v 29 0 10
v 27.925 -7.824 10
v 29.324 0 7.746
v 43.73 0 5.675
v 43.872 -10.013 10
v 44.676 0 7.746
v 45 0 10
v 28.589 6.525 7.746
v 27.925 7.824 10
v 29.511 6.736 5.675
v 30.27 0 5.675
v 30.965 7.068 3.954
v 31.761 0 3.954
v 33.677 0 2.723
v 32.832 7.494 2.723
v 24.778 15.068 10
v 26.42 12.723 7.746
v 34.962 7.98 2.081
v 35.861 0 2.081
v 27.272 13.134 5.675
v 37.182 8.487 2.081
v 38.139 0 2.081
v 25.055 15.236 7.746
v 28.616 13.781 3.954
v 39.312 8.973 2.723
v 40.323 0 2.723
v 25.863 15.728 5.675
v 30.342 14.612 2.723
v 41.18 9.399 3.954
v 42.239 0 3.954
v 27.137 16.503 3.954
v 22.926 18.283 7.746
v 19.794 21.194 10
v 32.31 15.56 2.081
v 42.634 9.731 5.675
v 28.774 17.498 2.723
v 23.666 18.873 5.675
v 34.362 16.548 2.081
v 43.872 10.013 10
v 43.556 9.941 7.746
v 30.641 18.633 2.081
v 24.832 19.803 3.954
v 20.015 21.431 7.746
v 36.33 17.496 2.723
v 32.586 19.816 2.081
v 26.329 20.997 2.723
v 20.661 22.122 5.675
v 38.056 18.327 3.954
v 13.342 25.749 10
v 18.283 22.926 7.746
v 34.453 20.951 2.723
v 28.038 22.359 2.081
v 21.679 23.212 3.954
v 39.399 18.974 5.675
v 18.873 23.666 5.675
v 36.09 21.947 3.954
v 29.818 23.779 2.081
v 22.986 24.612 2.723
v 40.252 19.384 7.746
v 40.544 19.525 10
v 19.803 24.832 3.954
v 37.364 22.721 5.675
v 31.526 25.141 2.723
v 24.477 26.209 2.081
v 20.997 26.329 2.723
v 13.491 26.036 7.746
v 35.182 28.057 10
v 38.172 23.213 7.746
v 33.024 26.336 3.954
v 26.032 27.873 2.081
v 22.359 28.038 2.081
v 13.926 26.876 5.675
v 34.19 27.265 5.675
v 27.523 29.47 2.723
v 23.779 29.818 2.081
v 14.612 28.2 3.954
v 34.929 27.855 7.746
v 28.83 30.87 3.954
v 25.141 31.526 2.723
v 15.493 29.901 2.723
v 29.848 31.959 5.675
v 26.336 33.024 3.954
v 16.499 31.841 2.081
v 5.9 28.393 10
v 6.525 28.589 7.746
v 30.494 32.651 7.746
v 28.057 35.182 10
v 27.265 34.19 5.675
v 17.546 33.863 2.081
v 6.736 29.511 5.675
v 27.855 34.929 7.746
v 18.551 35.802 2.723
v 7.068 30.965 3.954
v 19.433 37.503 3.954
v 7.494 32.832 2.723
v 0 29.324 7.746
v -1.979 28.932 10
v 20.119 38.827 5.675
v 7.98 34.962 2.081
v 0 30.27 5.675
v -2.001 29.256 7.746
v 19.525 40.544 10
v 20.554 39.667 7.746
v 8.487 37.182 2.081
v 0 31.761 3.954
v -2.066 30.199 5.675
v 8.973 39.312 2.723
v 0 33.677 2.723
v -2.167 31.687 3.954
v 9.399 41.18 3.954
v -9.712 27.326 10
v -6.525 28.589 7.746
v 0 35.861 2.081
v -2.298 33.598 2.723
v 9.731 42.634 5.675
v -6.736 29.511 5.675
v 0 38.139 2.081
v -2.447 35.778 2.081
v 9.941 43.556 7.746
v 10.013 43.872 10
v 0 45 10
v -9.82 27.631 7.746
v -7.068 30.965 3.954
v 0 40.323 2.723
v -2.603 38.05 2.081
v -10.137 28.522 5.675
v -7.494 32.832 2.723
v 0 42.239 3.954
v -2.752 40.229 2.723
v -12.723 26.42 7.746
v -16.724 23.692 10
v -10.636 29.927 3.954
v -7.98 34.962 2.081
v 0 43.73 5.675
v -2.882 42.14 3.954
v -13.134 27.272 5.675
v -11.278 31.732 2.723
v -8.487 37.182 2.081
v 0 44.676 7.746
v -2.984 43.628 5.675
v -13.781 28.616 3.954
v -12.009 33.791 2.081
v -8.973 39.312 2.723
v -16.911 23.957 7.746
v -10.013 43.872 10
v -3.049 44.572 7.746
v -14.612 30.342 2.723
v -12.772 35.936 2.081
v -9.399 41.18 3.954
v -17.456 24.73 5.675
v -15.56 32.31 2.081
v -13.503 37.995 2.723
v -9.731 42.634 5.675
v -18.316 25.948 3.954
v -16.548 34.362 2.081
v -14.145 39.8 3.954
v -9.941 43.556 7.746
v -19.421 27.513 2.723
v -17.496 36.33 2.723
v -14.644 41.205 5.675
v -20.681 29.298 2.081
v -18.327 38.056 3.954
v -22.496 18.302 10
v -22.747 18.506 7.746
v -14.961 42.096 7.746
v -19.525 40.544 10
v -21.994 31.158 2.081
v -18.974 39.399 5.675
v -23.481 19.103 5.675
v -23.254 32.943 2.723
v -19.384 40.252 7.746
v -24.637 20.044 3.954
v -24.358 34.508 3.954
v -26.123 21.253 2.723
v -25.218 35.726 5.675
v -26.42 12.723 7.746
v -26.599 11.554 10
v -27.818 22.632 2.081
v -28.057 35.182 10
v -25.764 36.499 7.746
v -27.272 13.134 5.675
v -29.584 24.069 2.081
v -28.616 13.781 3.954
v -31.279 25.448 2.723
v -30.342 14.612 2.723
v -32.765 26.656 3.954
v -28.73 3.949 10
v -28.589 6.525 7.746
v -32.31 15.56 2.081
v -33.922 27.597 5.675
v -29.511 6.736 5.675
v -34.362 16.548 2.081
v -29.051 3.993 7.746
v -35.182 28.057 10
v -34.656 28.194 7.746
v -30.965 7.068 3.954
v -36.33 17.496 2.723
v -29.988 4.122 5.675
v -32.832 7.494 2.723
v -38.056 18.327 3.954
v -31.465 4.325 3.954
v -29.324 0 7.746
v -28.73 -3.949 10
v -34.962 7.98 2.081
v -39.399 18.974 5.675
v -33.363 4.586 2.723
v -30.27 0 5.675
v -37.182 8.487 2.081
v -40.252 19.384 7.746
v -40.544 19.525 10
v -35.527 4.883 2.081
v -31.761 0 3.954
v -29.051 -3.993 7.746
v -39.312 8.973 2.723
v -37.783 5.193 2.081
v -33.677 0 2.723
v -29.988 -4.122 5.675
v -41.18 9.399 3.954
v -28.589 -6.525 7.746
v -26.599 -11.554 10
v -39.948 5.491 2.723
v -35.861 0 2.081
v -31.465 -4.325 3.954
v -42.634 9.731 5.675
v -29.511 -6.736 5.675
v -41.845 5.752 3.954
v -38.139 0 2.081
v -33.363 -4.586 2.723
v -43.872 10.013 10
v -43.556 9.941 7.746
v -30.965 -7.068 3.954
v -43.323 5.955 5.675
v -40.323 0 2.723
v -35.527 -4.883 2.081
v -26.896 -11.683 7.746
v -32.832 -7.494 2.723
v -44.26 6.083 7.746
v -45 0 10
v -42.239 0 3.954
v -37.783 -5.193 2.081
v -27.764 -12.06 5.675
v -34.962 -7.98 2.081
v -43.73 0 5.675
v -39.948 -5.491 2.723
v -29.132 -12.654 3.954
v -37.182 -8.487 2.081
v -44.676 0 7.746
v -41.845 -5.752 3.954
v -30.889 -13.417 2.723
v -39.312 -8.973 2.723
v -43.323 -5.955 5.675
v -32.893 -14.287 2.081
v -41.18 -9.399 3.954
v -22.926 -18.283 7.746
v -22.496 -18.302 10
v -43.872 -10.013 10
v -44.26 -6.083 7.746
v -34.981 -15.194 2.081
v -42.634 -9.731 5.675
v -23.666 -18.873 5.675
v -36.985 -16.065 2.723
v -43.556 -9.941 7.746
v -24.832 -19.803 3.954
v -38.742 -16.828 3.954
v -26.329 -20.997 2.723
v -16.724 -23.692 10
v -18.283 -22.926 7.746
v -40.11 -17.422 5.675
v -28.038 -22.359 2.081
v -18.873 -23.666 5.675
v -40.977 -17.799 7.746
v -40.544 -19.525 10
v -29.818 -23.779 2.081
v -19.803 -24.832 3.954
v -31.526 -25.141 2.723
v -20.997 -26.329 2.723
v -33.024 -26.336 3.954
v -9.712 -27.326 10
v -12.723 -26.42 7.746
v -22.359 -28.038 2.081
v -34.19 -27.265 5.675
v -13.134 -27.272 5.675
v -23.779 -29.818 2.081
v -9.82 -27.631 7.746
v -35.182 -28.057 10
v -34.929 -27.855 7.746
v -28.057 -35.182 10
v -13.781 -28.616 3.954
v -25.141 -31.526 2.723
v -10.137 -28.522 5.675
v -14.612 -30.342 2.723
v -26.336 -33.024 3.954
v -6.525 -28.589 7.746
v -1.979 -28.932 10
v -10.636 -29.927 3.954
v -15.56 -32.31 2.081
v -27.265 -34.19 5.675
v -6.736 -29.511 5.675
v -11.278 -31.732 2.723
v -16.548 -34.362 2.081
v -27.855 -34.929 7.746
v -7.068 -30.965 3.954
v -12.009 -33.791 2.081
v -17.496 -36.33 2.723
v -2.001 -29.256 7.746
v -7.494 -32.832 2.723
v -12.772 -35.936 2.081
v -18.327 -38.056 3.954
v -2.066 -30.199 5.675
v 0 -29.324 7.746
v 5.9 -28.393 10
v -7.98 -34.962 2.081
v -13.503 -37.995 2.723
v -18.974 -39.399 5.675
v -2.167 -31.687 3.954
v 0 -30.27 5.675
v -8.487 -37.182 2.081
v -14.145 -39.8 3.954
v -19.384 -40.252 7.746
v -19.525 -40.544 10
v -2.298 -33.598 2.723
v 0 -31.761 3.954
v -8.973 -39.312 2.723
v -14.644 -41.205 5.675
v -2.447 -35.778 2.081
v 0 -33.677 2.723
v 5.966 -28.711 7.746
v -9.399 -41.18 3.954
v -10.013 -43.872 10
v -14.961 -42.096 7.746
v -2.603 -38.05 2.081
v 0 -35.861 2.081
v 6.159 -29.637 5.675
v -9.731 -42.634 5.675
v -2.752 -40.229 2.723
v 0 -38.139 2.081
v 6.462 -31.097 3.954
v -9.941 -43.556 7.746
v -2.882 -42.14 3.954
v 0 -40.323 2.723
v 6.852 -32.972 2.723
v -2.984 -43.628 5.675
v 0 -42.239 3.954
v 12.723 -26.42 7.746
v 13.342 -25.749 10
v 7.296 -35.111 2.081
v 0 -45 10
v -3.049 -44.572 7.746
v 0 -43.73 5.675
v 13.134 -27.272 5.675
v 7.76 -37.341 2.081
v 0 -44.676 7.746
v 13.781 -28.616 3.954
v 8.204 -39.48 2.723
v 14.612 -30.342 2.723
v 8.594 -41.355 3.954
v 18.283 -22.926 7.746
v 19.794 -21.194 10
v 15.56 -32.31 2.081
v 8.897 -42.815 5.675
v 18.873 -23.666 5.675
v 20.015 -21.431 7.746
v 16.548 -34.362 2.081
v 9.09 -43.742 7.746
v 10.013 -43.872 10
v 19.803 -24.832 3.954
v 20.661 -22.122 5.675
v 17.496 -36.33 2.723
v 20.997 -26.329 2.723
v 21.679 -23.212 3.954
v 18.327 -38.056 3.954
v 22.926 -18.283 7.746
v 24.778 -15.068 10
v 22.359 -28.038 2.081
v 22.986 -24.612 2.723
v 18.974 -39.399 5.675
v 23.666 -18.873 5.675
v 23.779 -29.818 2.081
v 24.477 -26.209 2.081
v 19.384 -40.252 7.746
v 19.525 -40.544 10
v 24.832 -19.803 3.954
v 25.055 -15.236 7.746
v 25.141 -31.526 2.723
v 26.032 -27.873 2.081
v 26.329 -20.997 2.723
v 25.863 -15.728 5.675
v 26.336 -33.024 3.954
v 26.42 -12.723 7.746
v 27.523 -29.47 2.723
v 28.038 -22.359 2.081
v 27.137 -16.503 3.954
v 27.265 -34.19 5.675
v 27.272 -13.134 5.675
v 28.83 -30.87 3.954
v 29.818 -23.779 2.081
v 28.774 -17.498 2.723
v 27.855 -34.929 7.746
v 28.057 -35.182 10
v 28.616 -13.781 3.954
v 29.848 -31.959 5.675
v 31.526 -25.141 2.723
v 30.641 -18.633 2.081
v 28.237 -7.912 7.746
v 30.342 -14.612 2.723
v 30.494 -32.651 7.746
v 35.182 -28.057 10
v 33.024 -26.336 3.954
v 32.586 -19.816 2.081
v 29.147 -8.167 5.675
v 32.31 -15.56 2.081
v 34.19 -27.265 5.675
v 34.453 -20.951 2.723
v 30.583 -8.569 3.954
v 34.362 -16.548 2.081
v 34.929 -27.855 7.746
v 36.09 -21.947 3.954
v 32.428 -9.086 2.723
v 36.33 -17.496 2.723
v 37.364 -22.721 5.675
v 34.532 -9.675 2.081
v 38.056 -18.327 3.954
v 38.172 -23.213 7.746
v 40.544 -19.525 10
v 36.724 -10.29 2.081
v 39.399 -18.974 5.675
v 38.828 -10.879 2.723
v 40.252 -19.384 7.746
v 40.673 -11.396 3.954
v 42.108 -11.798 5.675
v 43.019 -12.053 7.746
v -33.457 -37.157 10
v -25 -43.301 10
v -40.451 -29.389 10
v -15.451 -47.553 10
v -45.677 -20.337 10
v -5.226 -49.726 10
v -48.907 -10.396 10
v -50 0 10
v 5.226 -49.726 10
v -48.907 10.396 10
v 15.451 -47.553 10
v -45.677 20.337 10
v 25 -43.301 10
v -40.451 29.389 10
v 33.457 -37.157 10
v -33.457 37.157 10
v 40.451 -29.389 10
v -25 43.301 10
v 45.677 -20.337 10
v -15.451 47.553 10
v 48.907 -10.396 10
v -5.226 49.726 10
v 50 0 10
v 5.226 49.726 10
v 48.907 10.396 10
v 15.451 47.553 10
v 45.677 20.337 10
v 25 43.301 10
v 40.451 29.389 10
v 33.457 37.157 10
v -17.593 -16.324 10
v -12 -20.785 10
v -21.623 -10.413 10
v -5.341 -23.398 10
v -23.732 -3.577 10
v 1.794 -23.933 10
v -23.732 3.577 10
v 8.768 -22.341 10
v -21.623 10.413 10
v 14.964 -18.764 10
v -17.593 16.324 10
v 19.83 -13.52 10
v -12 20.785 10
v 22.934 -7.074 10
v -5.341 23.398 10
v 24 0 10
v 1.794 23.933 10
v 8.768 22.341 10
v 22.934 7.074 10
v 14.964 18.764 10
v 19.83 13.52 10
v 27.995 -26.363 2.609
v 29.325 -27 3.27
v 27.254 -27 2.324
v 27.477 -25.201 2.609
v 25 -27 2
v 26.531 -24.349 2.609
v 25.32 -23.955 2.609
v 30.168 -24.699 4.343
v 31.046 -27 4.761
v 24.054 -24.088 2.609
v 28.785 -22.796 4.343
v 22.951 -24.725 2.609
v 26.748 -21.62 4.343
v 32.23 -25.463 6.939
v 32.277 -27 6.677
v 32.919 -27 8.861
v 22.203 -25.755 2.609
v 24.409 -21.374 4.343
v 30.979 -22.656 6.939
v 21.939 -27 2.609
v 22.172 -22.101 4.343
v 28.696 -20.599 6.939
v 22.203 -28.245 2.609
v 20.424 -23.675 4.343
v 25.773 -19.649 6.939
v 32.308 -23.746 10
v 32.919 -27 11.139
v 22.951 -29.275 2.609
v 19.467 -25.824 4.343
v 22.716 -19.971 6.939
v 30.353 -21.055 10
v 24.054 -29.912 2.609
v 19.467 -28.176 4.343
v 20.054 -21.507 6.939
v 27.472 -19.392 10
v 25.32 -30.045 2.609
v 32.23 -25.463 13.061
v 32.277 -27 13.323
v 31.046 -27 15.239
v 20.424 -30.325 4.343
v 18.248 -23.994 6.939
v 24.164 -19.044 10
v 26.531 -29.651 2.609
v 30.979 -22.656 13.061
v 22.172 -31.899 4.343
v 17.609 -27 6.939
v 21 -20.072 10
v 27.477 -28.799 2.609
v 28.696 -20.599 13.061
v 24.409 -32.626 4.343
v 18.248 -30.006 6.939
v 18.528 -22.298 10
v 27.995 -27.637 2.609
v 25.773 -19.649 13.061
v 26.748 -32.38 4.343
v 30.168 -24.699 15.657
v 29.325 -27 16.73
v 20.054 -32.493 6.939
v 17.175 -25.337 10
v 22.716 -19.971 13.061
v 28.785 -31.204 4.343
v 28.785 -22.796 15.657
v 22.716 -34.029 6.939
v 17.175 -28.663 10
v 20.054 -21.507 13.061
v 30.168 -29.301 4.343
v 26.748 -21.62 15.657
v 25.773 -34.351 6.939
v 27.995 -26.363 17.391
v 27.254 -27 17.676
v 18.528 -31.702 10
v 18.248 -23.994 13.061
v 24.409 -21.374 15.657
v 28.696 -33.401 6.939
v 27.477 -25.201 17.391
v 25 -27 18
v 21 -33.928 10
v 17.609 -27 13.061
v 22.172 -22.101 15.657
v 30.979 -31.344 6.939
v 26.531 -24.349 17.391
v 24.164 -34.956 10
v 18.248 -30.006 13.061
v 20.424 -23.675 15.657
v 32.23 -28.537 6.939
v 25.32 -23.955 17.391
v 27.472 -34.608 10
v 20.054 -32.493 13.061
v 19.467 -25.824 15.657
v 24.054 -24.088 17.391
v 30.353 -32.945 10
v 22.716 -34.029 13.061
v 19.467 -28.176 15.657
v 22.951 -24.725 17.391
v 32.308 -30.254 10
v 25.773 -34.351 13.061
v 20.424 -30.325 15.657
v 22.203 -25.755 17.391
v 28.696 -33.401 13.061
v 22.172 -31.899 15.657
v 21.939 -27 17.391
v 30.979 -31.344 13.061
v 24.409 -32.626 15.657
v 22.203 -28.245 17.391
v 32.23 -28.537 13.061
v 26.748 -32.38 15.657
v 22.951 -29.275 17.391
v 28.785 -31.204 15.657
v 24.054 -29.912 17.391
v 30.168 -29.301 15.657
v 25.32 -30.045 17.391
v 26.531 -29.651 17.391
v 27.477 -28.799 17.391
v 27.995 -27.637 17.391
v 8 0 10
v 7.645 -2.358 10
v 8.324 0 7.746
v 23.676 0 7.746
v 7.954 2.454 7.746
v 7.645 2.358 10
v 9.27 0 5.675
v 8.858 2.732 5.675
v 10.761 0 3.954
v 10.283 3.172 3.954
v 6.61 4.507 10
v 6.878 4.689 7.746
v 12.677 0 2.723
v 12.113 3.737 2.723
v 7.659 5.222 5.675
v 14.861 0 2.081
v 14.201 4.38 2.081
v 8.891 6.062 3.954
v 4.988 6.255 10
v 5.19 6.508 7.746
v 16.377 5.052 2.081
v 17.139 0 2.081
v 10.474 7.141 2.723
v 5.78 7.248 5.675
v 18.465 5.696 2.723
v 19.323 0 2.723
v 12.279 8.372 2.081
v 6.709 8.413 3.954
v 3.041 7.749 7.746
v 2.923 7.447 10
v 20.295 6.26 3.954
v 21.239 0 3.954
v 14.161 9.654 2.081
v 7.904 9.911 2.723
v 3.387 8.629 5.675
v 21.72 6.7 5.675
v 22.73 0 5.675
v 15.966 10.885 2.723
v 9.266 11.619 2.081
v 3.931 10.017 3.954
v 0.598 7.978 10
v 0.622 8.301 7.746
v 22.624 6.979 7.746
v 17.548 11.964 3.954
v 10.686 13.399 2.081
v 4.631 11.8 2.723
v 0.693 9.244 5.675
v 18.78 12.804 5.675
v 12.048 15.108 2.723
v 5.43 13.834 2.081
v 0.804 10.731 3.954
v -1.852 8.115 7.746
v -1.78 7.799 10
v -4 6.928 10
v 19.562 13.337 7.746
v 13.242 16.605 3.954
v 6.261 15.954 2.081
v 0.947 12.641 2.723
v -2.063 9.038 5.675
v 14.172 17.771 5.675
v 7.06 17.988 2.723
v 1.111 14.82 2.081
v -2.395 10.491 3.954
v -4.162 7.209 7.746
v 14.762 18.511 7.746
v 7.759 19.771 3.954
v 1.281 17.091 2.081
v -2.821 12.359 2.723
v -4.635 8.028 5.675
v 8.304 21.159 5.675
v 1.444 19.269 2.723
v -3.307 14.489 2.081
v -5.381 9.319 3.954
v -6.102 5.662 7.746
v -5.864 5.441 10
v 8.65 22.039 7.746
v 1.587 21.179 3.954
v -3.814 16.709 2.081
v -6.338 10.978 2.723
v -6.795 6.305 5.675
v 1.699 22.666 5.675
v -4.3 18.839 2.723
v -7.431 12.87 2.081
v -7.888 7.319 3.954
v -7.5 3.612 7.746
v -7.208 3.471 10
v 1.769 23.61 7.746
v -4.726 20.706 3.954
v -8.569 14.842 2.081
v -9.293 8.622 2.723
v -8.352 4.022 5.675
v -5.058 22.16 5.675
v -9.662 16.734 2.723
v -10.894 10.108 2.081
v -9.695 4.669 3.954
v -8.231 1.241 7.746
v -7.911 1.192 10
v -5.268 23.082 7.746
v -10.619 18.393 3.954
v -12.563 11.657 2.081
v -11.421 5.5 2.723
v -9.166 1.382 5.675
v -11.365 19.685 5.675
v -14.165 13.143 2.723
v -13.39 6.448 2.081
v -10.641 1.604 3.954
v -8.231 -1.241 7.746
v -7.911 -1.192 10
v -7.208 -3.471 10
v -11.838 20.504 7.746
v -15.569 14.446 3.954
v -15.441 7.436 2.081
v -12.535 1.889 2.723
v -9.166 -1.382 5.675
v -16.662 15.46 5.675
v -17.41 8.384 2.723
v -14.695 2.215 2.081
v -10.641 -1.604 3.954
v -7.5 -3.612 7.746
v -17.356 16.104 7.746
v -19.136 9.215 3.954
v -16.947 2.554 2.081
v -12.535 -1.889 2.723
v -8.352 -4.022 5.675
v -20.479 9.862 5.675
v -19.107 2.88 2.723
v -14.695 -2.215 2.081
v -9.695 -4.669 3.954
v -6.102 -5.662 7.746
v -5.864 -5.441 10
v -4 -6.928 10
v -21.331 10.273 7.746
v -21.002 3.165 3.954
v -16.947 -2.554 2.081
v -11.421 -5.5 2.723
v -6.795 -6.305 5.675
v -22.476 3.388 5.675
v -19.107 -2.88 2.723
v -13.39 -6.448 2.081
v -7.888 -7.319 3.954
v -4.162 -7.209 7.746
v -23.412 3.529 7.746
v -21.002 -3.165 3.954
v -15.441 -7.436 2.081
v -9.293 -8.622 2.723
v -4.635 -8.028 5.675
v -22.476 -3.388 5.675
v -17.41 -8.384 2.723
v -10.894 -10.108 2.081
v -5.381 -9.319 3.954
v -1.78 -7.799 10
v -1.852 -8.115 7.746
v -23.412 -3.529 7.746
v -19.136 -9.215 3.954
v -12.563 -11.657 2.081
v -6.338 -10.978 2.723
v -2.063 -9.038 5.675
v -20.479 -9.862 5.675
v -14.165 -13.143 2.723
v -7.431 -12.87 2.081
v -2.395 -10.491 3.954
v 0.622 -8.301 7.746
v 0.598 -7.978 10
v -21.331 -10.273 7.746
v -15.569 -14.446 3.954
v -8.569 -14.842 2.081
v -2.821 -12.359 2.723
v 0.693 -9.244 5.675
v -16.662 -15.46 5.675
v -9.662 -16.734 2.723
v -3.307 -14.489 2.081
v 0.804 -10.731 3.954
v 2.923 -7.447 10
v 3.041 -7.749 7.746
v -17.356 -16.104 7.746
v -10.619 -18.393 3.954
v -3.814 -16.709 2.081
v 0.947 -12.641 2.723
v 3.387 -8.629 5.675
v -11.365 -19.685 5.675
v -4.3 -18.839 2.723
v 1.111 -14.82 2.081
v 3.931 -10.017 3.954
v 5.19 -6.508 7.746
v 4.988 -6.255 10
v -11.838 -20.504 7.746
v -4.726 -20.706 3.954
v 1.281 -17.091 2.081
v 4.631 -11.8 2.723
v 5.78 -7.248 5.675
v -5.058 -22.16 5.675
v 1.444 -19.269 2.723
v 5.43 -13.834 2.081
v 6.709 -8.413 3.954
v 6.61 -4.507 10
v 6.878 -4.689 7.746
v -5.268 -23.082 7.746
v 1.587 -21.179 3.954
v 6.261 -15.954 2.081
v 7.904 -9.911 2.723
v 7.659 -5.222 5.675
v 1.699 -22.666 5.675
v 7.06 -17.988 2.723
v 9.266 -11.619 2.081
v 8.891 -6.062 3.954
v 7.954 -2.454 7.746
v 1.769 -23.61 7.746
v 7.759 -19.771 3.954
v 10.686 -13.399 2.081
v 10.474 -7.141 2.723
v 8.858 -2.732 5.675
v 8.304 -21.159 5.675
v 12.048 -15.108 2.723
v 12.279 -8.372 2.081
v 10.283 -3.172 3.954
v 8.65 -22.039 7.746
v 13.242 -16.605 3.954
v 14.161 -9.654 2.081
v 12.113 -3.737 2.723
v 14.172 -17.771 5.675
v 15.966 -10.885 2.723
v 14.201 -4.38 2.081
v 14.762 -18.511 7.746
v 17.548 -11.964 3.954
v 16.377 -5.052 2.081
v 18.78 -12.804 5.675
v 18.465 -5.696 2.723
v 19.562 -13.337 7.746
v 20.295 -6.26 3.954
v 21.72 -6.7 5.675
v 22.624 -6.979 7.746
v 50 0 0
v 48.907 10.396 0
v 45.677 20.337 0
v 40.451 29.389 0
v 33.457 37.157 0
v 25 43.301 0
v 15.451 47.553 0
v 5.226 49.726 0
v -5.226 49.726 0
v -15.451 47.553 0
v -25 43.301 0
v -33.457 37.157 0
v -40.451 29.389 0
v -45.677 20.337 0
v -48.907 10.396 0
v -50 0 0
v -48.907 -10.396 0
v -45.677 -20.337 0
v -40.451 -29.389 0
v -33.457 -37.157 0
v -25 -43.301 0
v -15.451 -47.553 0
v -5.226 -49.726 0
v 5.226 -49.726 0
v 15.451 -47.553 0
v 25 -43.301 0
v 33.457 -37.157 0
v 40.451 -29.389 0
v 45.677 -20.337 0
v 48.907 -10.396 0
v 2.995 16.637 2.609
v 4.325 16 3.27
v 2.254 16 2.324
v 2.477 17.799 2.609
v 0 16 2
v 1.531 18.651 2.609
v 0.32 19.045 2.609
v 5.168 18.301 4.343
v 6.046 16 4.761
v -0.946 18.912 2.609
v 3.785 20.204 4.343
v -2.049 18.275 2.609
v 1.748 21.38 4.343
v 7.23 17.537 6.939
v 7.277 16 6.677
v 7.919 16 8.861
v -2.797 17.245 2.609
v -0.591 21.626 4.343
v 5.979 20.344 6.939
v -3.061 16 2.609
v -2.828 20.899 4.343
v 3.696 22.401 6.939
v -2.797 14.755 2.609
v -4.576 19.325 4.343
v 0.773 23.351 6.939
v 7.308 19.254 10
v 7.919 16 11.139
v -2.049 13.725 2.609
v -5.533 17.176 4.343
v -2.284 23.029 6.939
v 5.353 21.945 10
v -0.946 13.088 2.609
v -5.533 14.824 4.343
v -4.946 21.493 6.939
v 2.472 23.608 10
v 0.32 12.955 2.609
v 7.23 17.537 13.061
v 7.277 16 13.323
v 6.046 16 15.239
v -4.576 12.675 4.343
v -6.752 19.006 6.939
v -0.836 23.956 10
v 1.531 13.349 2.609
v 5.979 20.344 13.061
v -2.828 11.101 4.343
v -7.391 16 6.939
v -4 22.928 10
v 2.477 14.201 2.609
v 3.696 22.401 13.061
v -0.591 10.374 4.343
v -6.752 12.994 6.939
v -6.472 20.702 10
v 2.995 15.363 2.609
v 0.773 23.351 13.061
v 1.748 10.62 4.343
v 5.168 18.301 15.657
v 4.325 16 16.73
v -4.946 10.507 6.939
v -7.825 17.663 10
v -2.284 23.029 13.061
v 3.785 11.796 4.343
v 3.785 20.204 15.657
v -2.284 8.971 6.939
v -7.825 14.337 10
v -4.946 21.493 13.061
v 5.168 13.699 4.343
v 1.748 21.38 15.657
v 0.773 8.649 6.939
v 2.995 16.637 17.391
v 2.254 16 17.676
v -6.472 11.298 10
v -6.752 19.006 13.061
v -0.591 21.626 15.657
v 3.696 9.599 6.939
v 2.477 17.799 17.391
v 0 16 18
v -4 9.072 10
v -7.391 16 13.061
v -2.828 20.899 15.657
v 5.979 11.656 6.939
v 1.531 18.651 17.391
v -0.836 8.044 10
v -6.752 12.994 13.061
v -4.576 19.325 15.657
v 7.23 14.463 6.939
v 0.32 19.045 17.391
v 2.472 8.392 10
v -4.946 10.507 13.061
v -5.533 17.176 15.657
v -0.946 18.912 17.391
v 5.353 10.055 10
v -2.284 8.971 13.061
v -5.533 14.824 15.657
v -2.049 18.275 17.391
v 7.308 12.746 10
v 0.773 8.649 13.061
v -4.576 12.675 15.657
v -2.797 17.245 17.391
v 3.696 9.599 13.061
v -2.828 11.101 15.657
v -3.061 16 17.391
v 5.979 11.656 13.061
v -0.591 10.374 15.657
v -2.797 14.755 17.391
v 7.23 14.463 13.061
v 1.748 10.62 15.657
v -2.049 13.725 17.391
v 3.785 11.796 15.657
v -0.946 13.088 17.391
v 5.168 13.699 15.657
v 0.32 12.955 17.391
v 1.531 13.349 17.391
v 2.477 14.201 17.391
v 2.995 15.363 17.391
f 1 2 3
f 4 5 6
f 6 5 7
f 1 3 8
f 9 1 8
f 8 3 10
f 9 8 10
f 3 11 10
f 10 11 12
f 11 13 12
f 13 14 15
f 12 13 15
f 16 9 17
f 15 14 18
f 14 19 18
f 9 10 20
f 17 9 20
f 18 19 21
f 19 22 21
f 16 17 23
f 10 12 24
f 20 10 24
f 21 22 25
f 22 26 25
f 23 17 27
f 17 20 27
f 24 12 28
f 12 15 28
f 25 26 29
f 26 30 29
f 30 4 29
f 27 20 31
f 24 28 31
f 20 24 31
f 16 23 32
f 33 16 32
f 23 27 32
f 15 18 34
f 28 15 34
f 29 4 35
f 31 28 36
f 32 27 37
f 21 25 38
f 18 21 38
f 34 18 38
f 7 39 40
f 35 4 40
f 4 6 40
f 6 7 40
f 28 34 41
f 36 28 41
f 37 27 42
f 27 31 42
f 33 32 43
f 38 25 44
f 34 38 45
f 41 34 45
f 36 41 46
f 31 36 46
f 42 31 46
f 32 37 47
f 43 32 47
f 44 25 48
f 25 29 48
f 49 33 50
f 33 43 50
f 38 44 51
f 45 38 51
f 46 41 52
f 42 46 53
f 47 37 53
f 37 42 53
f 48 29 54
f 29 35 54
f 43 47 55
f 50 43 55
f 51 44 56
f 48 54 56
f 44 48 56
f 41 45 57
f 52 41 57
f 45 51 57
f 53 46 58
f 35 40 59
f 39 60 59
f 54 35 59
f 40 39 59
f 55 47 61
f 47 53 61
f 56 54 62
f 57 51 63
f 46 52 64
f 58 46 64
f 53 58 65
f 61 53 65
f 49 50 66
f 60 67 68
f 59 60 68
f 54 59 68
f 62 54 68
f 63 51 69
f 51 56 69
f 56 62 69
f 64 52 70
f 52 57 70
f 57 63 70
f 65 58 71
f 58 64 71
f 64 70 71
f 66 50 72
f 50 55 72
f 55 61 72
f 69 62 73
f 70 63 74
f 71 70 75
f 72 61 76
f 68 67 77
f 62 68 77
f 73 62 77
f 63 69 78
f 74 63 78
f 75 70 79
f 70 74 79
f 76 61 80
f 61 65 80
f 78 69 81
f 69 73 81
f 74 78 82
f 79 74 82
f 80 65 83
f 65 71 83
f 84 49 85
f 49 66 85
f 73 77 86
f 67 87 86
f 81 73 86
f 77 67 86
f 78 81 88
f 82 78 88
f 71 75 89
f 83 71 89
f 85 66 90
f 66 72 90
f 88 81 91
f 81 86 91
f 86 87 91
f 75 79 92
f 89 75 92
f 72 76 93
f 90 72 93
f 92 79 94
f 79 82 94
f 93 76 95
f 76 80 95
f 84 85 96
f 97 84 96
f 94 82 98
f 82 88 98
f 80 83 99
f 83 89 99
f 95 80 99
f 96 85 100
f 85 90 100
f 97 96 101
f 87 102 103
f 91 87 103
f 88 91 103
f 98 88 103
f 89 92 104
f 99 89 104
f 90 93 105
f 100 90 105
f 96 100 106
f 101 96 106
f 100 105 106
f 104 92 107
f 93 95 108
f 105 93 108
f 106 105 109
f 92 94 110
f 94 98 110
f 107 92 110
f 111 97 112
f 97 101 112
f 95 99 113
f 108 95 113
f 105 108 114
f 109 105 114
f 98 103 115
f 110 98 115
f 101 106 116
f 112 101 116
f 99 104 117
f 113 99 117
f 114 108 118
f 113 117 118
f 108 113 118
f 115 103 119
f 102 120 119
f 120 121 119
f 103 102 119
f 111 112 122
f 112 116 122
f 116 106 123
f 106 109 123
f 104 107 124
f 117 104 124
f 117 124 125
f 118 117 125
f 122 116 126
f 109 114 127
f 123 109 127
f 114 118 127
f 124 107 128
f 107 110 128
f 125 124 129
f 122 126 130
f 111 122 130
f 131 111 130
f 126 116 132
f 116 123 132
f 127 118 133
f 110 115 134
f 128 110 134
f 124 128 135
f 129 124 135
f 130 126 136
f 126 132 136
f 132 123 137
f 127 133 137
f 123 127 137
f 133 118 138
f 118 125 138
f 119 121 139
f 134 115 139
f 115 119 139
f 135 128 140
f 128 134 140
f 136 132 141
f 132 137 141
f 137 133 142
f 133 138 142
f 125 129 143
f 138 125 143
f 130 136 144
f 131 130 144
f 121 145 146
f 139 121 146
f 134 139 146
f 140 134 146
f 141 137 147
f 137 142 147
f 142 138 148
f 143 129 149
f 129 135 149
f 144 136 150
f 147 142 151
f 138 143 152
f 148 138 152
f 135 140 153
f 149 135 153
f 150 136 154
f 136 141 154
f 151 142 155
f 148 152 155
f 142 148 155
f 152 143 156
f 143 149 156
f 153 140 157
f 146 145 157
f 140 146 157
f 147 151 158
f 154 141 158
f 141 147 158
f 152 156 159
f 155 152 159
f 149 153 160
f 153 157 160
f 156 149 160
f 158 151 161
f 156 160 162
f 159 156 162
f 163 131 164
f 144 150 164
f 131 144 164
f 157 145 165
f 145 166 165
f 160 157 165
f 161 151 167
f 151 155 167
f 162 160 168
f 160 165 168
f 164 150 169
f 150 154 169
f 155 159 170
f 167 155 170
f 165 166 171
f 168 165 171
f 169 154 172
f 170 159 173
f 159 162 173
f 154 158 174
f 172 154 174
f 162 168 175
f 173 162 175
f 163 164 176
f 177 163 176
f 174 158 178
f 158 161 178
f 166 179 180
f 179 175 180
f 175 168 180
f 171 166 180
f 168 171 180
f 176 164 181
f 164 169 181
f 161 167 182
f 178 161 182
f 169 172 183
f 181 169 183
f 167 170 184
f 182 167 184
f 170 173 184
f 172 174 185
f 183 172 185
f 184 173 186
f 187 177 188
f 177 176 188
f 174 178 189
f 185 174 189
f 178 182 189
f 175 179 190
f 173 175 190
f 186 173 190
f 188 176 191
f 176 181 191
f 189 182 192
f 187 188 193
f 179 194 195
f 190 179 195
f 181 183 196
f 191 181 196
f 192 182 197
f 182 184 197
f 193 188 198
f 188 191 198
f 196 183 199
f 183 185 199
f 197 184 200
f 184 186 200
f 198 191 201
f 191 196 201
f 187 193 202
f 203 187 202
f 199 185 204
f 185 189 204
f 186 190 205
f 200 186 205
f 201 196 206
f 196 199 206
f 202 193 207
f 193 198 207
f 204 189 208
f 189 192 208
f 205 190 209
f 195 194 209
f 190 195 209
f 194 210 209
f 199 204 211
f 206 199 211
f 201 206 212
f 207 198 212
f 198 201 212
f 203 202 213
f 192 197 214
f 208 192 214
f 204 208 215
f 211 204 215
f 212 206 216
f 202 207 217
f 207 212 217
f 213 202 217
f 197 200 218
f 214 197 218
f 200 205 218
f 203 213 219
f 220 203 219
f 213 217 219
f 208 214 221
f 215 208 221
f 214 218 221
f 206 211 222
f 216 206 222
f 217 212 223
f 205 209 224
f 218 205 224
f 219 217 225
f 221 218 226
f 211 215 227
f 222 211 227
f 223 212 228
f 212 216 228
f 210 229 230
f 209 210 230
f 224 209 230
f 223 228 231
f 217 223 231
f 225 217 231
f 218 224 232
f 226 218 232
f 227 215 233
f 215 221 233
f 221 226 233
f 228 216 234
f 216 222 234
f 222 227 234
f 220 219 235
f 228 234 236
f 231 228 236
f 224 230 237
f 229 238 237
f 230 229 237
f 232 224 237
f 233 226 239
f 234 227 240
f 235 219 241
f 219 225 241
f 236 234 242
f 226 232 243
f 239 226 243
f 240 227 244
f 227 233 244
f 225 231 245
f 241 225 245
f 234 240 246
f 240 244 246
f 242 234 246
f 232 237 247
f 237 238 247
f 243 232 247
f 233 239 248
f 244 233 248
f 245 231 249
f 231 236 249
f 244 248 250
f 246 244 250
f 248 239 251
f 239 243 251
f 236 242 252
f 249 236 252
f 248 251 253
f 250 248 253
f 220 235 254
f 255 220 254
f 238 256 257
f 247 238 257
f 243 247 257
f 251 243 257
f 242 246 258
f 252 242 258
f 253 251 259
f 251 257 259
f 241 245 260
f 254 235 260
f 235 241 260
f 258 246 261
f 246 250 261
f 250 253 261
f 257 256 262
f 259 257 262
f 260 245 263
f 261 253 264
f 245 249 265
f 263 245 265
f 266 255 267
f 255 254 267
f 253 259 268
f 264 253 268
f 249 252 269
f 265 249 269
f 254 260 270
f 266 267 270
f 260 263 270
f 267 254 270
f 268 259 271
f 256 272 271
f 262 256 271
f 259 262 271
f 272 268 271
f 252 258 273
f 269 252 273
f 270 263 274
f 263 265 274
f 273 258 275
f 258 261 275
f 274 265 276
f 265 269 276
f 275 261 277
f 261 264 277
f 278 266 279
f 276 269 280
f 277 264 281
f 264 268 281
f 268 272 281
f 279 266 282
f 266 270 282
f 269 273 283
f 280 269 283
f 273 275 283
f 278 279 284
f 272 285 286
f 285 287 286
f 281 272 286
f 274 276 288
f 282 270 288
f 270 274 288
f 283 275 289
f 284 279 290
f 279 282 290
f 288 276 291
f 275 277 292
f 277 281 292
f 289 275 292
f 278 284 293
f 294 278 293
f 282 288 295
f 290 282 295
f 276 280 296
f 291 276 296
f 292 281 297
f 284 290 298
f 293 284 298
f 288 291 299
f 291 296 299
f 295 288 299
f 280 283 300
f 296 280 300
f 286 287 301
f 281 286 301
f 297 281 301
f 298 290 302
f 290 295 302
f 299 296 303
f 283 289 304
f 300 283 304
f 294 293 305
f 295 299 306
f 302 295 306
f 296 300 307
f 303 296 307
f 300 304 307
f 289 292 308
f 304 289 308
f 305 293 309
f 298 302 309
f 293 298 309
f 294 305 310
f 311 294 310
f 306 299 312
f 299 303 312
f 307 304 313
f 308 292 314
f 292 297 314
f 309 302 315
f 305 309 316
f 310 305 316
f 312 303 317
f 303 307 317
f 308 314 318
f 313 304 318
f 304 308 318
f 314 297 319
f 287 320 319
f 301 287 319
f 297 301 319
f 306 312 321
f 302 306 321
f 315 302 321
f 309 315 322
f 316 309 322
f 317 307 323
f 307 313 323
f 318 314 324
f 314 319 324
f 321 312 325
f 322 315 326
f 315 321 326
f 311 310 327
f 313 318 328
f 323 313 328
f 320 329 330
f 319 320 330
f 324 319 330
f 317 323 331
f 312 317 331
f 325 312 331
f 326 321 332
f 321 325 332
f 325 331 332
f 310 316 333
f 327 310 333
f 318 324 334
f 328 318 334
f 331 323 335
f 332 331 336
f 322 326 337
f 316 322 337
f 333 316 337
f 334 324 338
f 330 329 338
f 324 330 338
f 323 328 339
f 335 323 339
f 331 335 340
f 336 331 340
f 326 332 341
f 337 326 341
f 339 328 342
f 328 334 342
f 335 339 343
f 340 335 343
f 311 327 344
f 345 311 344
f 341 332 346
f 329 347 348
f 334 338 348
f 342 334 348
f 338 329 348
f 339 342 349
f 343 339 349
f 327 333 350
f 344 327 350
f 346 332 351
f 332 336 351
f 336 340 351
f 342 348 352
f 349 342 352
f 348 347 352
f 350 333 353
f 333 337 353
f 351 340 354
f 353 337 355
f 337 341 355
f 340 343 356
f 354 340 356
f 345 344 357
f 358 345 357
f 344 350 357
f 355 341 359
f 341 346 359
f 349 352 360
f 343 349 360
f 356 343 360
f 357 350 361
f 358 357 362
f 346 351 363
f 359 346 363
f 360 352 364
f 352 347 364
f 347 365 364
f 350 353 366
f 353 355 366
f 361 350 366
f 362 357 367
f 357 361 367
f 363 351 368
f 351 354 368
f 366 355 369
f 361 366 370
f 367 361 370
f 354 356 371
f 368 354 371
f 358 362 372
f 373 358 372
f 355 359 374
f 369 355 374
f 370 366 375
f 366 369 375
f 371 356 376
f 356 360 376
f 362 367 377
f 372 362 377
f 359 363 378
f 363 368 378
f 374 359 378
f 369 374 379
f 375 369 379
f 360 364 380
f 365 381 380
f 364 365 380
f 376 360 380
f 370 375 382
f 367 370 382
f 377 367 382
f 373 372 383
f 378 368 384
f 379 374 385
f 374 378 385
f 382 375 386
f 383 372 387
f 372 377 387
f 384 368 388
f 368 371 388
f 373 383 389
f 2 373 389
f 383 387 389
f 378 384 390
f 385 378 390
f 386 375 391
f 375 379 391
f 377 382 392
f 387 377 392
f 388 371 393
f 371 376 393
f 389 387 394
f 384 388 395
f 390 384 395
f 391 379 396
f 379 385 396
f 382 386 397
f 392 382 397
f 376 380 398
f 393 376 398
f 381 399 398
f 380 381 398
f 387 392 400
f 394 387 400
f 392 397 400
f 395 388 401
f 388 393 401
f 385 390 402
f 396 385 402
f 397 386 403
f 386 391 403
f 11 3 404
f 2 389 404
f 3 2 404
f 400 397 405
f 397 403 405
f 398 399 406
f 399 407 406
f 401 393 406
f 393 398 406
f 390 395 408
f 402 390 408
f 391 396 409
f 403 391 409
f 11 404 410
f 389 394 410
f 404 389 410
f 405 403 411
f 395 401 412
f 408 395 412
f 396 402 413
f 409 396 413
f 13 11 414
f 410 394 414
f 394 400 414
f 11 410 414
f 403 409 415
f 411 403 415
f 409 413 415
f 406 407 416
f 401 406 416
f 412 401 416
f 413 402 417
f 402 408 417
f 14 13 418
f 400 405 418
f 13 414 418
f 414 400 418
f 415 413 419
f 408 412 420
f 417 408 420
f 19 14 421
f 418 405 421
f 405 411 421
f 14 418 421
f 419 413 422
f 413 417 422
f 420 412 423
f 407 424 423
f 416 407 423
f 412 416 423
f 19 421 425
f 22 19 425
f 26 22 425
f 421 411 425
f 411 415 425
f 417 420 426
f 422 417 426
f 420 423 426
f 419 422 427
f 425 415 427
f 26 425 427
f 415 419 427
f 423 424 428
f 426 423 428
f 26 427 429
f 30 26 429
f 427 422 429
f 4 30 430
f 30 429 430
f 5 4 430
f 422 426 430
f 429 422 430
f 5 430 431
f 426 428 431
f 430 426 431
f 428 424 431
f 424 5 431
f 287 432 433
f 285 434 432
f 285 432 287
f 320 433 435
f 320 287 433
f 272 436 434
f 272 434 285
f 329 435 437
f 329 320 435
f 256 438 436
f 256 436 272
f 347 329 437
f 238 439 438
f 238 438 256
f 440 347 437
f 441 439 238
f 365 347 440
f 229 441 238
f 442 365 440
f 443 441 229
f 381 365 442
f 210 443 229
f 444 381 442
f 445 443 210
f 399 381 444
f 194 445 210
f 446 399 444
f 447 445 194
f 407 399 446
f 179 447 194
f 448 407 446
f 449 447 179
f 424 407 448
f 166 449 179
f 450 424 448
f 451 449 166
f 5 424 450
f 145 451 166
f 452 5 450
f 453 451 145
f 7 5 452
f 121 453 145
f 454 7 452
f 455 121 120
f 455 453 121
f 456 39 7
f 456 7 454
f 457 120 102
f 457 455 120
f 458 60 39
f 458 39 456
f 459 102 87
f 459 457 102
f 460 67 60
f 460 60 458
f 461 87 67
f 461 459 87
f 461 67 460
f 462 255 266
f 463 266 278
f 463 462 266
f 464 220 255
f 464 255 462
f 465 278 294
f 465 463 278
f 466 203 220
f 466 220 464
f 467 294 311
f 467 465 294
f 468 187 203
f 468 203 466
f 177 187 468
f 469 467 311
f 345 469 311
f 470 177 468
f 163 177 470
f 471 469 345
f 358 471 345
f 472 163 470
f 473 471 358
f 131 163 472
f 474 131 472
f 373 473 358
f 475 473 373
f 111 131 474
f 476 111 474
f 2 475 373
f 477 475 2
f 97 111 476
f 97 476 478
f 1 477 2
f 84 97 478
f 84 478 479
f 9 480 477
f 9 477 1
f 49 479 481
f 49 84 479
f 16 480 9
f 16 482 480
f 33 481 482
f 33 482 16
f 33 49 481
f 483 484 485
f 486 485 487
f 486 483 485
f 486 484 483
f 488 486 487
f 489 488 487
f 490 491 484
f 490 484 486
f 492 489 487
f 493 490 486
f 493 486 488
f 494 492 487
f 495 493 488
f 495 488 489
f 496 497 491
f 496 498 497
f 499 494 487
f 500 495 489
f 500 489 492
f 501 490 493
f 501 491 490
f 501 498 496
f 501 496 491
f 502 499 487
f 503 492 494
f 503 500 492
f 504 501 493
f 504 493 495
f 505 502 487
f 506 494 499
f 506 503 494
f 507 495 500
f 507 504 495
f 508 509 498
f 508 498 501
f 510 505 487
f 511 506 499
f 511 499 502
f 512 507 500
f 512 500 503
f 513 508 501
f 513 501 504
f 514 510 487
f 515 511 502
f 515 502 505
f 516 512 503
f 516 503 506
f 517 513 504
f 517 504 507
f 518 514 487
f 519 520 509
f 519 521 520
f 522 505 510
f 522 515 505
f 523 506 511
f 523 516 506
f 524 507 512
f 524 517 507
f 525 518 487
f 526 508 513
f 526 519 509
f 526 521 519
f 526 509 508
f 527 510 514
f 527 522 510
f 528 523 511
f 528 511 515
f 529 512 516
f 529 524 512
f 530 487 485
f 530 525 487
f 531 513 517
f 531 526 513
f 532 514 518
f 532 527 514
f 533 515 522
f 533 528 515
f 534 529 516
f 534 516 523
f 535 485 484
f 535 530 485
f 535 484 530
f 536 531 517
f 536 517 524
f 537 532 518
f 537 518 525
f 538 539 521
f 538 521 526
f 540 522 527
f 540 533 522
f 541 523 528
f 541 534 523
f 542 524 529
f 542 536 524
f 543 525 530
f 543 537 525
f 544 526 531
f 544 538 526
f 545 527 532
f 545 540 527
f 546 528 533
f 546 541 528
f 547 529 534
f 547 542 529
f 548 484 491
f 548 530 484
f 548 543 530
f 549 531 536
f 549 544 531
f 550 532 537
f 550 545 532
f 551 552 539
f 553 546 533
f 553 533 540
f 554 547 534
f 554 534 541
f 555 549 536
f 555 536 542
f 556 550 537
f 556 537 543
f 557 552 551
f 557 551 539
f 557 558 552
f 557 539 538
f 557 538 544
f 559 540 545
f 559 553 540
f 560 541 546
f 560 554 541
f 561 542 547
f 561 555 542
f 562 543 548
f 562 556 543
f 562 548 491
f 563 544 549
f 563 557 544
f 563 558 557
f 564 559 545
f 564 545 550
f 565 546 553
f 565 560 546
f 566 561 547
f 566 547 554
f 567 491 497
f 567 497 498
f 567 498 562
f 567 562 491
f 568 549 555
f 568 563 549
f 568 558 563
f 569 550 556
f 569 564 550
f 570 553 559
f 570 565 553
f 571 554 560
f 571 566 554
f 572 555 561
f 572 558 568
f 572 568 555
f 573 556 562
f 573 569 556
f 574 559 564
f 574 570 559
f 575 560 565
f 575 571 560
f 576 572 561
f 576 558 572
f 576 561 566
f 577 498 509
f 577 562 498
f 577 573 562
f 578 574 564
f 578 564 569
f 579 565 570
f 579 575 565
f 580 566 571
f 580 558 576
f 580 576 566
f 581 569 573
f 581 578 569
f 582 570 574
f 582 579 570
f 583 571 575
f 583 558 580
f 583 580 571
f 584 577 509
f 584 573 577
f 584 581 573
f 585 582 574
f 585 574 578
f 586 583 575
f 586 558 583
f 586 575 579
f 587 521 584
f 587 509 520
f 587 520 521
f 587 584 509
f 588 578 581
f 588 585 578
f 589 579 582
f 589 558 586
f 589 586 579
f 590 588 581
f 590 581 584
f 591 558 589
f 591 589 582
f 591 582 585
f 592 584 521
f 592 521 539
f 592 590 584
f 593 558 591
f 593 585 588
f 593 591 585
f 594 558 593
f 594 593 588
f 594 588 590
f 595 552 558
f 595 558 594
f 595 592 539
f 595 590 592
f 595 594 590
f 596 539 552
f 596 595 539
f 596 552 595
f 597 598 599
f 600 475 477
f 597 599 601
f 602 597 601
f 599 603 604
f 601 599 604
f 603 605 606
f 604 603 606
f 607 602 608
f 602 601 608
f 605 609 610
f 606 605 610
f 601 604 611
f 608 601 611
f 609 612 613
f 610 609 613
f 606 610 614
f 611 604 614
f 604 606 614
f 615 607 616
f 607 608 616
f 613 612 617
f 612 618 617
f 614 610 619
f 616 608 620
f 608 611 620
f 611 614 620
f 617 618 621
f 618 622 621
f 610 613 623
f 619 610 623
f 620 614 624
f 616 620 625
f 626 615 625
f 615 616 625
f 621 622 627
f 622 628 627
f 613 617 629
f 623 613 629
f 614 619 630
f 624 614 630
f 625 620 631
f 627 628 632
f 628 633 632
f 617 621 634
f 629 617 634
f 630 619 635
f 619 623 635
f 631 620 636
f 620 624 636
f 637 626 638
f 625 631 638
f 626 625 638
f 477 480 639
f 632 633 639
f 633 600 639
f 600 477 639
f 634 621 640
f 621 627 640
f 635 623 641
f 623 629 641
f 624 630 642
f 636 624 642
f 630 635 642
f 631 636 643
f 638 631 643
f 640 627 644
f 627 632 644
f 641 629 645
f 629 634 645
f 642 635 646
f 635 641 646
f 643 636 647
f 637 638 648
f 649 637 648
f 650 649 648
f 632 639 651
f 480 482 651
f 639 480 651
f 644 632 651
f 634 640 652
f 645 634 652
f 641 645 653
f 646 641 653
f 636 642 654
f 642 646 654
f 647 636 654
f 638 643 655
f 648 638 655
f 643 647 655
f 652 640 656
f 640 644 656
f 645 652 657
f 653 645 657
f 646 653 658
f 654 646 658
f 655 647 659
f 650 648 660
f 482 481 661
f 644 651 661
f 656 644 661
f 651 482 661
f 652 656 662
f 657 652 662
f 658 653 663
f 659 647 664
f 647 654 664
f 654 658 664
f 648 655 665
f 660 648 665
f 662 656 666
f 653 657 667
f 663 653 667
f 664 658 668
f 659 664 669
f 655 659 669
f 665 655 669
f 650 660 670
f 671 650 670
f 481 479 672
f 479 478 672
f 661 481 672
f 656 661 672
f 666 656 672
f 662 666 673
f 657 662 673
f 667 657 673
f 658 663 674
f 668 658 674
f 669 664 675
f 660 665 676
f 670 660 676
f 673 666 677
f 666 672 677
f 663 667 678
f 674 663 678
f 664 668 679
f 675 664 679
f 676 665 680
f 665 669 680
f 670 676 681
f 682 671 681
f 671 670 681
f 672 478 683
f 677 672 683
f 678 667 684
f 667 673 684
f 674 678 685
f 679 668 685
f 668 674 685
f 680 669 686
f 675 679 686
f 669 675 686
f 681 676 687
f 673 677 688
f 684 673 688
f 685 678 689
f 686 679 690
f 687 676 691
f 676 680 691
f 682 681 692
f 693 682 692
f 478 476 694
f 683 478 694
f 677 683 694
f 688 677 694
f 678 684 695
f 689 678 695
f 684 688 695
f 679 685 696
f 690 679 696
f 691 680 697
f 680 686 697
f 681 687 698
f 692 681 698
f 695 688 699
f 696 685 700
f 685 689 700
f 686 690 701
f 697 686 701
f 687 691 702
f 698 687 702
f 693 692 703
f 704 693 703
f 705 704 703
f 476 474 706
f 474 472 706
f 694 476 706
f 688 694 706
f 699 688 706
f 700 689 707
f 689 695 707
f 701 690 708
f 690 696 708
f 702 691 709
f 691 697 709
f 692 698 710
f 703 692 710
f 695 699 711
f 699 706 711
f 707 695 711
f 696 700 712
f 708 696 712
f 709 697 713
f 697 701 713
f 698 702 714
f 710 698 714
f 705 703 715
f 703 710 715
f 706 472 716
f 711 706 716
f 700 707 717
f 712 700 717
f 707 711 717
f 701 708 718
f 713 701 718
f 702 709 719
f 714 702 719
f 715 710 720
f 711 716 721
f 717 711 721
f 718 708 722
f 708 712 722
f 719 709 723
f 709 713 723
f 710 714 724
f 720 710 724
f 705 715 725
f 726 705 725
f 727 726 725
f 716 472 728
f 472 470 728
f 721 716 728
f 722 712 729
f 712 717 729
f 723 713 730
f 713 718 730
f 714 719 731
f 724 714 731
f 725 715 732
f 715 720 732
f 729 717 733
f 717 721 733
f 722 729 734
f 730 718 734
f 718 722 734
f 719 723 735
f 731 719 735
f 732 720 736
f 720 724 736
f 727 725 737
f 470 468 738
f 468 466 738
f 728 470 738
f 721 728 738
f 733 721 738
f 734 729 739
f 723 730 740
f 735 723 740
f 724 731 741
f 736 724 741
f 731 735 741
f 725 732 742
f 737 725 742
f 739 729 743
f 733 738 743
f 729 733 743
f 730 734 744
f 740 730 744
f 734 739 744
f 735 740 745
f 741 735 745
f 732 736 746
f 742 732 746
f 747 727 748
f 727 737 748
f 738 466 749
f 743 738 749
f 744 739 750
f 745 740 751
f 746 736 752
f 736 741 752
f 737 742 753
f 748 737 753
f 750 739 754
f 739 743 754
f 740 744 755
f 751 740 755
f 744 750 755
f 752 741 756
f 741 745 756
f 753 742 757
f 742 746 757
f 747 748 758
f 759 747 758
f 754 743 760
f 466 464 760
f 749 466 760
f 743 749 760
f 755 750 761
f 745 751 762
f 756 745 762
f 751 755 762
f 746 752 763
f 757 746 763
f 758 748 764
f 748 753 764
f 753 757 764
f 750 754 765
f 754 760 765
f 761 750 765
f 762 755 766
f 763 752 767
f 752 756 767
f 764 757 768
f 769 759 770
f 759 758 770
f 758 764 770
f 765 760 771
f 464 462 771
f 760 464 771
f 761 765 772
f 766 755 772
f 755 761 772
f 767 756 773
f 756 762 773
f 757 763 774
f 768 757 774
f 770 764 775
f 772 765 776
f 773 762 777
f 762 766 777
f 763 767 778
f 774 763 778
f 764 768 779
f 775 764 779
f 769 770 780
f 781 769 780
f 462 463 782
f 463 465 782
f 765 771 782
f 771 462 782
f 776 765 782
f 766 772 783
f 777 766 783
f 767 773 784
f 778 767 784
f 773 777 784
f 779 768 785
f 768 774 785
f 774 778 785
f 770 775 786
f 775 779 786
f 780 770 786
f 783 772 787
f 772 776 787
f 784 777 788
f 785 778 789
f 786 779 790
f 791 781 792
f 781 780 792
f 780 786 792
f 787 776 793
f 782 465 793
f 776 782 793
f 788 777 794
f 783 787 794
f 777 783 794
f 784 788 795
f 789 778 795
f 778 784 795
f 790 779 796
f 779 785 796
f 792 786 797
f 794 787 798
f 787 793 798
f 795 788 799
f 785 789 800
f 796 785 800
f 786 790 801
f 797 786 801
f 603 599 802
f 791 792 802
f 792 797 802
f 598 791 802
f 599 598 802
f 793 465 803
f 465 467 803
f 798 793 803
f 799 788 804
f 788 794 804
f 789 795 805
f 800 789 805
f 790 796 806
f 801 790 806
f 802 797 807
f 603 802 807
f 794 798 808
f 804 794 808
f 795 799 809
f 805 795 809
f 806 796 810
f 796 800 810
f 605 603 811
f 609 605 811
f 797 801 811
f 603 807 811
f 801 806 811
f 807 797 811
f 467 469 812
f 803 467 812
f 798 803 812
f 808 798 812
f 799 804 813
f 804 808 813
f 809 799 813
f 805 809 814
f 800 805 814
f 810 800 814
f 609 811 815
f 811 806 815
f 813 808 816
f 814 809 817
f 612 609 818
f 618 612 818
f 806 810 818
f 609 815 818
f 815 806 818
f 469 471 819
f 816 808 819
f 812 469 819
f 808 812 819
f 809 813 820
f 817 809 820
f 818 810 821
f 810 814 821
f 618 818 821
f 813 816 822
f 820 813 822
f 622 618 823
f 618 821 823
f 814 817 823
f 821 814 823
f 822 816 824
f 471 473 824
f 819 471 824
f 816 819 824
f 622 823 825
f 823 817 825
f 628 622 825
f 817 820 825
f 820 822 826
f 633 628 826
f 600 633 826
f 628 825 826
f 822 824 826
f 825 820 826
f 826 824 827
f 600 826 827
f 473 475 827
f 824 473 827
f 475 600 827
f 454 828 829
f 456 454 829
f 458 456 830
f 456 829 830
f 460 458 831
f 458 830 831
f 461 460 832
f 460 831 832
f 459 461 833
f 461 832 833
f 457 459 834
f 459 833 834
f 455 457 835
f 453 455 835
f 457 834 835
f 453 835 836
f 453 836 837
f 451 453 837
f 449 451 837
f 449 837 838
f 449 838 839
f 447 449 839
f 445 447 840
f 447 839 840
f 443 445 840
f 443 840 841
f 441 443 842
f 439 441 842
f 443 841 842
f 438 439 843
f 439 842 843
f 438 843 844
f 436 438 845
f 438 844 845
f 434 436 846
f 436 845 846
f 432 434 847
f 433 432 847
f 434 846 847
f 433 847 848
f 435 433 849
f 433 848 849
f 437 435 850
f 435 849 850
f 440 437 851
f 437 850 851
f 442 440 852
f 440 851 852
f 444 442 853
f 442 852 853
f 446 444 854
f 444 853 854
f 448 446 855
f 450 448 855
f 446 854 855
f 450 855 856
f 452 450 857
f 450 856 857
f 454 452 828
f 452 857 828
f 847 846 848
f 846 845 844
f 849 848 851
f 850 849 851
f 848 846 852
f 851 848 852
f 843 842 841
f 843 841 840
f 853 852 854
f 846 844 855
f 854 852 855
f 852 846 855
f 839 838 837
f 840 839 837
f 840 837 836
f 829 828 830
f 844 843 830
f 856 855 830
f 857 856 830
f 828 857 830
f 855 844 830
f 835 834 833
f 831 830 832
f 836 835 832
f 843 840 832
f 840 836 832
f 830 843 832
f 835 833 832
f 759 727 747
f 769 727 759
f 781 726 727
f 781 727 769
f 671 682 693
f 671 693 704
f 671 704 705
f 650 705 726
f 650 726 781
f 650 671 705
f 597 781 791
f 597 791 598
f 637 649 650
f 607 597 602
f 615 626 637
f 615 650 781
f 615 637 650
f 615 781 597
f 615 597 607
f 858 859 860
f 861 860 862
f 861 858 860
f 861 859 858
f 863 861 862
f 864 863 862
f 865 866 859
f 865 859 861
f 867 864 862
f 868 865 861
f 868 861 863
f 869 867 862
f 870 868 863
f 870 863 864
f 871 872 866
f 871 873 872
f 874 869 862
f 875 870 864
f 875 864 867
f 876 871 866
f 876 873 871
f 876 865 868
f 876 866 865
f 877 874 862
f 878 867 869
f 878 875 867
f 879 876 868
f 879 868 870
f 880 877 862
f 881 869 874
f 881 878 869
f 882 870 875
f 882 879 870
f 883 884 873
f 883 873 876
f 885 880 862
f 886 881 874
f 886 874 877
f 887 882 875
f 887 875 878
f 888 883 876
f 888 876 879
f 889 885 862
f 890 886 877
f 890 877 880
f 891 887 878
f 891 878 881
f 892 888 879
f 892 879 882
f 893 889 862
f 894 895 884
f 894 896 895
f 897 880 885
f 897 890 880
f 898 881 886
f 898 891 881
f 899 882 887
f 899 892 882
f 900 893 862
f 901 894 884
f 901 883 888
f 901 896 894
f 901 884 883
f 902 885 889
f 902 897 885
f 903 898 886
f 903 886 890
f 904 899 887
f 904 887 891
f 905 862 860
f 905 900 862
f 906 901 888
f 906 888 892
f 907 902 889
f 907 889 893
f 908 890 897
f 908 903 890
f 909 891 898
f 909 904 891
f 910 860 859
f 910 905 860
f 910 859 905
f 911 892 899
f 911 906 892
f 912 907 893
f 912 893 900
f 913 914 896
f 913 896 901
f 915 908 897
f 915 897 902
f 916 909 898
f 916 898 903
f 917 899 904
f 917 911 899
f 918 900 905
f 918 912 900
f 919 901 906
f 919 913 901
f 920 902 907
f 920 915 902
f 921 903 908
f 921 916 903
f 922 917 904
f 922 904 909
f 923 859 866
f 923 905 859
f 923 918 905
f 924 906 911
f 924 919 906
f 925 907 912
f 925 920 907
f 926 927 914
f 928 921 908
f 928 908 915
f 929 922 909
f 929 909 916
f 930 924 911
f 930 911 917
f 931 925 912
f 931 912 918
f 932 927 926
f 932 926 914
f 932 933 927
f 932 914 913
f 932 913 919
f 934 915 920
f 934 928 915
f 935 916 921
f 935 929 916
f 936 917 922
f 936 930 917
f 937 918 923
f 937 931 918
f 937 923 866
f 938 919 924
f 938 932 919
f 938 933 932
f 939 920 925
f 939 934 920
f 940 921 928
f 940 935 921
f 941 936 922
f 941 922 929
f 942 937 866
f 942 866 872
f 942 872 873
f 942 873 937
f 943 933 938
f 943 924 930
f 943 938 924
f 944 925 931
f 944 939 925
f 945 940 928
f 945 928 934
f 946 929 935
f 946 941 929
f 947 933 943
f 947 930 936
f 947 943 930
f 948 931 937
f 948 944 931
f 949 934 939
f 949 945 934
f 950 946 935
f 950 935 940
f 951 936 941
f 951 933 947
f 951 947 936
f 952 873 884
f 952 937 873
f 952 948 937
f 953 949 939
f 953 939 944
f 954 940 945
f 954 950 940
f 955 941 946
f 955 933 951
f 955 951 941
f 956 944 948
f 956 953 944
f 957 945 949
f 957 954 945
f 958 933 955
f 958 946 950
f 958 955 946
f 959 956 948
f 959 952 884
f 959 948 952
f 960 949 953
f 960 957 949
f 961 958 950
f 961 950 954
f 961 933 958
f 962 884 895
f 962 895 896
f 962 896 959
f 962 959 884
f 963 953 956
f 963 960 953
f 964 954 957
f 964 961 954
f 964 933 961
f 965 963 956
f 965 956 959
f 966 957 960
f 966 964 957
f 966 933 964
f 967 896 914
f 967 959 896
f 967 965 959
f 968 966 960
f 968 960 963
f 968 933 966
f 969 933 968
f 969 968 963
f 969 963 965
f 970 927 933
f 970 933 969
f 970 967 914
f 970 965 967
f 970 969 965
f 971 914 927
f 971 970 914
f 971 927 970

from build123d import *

# Parameters (mm, degrees)
TORUS001_R     = 8
TORUS_R        = 8
CYLINDER_R     = 50
CYLINDER_DEPTH = 10


with BuildPart() as torus001:
    # Torus001 → Torus001 (revolve)
    with BuildSketch(Plane(origin=(0, 0, 10), x_dir=(1, 0, 0), z_dir=(0, -1, 0))):
        with Locations((37, 0)):
            Circle(TORUS001_R)
    revolve(axis=Axis((0, 0, 10), (0, 0, 1)))


with BuildPart() as torus:
    # Torus → Torus (revolve)
    with BuildSketch(Plane(origin=(0, 0, 10), x_dir=(1, 0, 0), z_dir=(0, -1, 0))):
        with Locations((16, 0)):
            Circle(TORUS_R)
    revolve(axis=Axis((0, 0, 10), (0, 0, 1)))


with BuildPart() as cut001:
    # Cylinder → Cylinder (new body)
    with BuildSketch(Plane.XY):
        Circle(CYLINDER_R)
    extrude(amount=CYLINDER_DEPTH)

    # Cut: cut Torus
    add(torus.part, mode=Mode.SUBTRACT)

    # Cut001: cut Torus001
    add(torus001.part, mode=Mode.SUBTRACT)


with BuildPart() as esfera:
    # Sphere → Sphere (revolve)
    with BuildSketch(Plane(origin=(0, 16, 10), x_dir=(1, 0, 0), z_dir=(0, -1, 0))):
        with BuildLine():
            ThreePointArc((0, -8), (8, 0), (0, 8))
            Line((0, 8), (0, -8))
        make_face()
    revolve(axis=Axis((0, 16, 10), (0, 0, 1)))


with BuildPart() as esfera001:
    # Sphere001 → Sphere001 (revolve)
    with BuildSketch(Plane(origin=(25, -27, 10), x_dir=(1, 0, 0), z_dir=(0, -1, 0))):
        with BuildLine():
            ThreePointArc((0, -8), (8, 0), (0, 8))
            Line((0, 8), (0, -8))
        make_face()
    revolve(axis=Axis((25, -27, 10), (0, 0, 1)))


solid = Compound([cut001.part, esfera.part, esfera001.part])
